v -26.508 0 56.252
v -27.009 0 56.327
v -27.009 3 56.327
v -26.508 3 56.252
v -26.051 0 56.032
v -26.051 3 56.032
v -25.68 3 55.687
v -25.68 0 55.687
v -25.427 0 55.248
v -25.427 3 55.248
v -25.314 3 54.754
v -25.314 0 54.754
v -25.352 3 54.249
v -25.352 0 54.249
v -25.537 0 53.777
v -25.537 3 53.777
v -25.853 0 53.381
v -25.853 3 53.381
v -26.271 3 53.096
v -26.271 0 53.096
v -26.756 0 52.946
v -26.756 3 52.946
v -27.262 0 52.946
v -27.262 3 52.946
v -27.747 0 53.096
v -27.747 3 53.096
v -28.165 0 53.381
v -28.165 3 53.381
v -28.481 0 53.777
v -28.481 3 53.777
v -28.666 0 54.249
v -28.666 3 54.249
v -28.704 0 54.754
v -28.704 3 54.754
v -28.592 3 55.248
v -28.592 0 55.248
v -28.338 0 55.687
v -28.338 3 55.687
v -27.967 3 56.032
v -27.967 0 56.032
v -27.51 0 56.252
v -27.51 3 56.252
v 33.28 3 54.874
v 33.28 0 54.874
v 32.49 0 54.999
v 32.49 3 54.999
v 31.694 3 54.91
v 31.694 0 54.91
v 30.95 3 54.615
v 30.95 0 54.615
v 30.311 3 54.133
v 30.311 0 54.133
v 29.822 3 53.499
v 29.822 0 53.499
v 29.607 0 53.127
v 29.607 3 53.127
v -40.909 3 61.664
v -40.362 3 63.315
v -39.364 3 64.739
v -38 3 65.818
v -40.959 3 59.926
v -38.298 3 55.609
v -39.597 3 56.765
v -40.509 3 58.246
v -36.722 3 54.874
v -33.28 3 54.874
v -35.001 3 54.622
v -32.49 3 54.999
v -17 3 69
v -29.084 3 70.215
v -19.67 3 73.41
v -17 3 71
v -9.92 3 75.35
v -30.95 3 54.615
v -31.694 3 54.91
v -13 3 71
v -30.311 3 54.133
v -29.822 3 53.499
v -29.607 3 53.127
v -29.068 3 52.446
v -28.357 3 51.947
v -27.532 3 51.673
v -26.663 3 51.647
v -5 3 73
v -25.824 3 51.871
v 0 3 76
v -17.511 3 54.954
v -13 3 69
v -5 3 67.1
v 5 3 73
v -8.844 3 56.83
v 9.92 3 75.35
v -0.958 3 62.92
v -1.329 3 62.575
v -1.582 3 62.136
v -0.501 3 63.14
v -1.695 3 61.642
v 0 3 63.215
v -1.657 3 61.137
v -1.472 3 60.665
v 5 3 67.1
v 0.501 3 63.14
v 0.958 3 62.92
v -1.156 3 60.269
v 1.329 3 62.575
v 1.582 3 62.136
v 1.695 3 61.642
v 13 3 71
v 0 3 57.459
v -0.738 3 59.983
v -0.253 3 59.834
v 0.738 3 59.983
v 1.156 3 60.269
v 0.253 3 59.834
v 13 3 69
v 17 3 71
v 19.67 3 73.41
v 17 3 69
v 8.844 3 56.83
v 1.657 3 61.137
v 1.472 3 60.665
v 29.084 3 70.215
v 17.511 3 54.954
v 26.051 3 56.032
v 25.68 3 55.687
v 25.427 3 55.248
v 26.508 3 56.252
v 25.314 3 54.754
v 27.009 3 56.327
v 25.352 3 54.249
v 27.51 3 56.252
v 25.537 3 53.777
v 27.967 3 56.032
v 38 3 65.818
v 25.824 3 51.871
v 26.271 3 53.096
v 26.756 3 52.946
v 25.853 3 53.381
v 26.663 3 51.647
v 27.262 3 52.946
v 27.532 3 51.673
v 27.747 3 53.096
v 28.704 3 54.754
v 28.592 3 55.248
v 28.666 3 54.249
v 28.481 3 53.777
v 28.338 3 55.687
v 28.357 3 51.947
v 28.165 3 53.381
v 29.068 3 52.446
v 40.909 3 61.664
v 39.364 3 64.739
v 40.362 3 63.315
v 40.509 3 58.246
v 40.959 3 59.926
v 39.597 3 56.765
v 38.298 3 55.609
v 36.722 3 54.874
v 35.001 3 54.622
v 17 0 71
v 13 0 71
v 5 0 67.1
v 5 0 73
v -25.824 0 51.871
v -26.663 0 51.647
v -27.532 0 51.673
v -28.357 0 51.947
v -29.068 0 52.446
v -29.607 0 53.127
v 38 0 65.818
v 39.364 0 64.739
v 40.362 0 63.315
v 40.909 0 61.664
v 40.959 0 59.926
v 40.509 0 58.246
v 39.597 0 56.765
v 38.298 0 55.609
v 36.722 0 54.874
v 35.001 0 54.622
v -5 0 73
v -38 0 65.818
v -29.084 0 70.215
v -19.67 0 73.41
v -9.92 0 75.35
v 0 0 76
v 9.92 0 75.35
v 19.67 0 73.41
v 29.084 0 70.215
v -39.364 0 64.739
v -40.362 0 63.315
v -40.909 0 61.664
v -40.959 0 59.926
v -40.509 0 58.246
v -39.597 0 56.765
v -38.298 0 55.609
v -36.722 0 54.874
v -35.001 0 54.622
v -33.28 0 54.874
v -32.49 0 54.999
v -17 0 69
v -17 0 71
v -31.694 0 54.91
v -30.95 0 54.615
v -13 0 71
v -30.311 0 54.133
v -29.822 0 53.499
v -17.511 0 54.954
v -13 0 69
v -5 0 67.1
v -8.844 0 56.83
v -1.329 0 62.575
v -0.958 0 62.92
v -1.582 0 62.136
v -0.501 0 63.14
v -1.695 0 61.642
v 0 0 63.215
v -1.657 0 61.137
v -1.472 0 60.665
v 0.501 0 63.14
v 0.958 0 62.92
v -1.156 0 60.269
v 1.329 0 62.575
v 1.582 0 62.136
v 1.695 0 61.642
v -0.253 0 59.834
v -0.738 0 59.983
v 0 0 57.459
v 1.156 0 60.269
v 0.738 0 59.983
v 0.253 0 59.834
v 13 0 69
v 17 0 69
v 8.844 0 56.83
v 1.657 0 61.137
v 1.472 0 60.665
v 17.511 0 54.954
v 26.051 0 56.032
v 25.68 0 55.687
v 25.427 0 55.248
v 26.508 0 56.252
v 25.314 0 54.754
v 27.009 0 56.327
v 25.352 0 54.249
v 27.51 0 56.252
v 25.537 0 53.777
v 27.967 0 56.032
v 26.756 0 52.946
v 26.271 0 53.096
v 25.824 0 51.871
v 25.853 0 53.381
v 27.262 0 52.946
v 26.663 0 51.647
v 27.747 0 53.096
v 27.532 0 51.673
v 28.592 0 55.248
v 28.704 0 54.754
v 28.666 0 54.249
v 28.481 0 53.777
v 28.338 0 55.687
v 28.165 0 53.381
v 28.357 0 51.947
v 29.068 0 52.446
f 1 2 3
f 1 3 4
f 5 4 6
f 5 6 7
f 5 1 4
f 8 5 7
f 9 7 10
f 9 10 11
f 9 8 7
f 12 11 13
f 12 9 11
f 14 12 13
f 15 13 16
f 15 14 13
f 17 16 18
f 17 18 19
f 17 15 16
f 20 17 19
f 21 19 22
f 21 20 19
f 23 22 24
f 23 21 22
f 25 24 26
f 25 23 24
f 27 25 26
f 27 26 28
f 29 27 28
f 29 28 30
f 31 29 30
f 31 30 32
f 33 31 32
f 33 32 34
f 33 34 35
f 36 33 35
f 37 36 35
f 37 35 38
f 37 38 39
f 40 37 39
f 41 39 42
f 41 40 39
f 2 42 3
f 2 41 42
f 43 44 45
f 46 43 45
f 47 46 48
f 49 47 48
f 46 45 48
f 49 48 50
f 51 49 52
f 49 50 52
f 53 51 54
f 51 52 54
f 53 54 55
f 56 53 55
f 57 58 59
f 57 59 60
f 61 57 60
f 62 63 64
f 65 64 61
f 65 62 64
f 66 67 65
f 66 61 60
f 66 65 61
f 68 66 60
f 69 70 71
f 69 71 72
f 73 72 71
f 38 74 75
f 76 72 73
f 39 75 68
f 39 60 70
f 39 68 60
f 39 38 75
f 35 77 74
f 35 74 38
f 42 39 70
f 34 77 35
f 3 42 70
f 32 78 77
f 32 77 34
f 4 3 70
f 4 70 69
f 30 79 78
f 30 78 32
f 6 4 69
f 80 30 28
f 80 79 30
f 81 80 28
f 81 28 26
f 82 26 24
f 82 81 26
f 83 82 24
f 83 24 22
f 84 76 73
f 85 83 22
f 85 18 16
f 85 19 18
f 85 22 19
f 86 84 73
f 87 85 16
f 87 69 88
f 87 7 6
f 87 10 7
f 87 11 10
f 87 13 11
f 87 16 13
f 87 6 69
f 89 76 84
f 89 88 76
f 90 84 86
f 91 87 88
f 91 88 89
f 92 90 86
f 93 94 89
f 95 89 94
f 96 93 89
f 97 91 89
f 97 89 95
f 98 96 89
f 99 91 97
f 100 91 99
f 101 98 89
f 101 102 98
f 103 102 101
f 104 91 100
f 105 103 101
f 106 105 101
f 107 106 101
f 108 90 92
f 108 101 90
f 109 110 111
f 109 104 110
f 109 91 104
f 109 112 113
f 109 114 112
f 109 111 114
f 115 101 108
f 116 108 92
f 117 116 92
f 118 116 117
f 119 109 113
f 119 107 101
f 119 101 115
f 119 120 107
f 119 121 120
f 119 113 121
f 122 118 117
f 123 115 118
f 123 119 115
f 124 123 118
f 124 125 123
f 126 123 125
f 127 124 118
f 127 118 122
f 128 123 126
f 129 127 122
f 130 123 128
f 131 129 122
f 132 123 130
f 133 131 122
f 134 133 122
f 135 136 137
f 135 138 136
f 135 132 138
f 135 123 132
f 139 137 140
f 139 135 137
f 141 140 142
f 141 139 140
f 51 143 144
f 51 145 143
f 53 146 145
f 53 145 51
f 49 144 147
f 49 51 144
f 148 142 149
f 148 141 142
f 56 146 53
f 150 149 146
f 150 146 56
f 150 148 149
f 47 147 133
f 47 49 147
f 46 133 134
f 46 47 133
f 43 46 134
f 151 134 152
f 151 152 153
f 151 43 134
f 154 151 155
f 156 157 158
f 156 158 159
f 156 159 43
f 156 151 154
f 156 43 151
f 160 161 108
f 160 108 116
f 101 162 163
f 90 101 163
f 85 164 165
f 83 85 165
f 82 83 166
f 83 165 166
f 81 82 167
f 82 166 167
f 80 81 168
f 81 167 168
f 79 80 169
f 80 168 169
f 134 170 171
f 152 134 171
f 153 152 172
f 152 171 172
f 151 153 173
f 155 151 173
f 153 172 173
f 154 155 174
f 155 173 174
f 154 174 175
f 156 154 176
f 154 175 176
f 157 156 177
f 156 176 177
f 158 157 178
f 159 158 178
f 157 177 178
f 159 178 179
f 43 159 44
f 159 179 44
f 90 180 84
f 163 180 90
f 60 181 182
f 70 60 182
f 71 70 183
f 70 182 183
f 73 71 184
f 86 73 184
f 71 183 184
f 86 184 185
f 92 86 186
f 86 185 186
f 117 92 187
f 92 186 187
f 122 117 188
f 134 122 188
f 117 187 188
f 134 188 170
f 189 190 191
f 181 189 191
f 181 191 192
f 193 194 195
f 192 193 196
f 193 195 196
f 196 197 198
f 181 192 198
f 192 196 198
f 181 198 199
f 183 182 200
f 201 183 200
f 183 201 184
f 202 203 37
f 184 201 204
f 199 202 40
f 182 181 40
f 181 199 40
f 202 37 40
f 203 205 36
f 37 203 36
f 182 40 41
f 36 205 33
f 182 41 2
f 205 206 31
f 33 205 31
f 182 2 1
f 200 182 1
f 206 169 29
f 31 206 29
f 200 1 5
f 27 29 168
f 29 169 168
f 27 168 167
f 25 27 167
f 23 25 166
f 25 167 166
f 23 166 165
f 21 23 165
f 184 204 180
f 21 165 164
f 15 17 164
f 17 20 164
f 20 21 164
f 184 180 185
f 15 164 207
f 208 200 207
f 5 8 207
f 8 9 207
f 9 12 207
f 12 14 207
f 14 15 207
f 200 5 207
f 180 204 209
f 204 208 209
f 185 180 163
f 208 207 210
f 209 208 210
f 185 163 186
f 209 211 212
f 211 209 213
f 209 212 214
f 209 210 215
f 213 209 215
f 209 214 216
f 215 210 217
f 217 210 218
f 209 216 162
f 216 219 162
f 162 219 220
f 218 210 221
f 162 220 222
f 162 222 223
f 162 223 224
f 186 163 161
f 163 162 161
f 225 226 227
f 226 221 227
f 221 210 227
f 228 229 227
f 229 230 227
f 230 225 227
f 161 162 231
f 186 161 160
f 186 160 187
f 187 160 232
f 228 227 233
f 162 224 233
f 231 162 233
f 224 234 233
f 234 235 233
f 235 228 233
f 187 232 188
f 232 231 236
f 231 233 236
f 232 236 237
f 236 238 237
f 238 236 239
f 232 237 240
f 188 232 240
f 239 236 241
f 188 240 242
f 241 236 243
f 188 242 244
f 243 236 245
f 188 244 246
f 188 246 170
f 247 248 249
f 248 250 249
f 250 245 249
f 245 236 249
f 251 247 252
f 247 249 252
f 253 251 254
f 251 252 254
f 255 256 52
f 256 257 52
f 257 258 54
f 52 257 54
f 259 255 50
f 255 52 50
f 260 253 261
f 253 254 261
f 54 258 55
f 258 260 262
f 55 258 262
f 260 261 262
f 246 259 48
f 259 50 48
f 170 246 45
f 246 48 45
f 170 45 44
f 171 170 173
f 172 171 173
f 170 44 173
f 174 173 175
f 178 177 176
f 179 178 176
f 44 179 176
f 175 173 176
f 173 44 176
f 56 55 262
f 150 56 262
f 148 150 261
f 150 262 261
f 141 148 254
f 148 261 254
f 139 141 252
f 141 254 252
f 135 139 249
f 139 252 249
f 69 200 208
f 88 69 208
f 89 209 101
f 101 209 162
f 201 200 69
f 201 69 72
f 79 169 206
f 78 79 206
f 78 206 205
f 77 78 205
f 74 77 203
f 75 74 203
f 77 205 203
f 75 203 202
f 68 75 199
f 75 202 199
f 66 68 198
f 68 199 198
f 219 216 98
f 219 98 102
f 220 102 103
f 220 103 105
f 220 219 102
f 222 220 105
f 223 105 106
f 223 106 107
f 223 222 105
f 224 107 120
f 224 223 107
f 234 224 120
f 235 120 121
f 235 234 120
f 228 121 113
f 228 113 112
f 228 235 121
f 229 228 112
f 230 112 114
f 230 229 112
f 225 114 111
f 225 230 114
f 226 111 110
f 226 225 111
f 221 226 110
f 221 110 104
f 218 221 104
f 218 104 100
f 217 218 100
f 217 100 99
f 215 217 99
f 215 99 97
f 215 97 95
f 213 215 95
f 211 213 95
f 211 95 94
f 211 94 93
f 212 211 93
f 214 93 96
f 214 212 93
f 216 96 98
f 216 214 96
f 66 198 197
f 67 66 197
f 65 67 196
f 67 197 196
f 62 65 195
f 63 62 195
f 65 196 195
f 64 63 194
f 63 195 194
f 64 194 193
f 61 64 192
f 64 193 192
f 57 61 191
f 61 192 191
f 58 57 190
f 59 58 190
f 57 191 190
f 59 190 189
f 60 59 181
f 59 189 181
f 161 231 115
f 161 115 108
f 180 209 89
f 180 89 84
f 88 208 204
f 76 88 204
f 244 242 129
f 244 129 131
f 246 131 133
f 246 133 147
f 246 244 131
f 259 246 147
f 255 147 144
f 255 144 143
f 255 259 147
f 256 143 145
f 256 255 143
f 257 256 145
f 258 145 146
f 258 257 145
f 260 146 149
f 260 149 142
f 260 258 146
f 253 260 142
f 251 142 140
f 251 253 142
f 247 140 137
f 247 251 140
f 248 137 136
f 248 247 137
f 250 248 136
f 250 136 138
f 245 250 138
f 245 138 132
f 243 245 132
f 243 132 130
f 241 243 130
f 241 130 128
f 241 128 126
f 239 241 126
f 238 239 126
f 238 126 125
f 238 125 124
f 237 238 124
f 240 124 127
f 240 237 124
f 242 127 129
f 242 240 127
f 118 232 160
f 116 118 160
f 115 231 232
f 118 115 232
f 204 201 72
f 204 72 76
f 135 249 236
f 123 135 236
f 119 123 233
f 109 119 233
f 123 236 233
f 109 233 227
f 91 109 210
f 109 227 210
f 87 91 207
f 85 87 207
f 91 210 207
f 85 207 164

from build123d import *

# Parameters (mm, degrees)
CROQUIS1_R              = 1.7
SALIENTE_EXTRUIR1_DEPTH = 3
CORTAR_EXTRUIR1_REACH   = 88.406
CROQUIS3_W              = 4
CROQUIS3_H              = 2
CROQUIS3_W_2            = 10
CROQUIS3_H_2            = 5.9


with BuildPart() as part:
    # Croquis1 → Saliente-Extruir1 (new body)
    with BuildSketch(Plane(origin=(0, 0, 0), x_dir=(1, 0, 0), z_dir=(0, 1, 0))):
        with BuildLine():
            Line((-29.607107898, -53.127168991), (-29.822053636, -53.49946593))
            ThreePointArc((-29.822053636, -53.49946593), (-31.312291696, -54.787421208), (-33.280086565, -54.873570042))
            ThreePointArc((-33.280086565, -54.873570042), (-40.509483904, -58.24573384), (-38, -65.817930688))
            ThreePointArc((-38, -65.817930688), (0, -76), (38, -65.817930688))
            ThreePointArc((38, -65.817930688), (40.509483904, -58.24573384), (33.280086565, -54.873570042))
            ThreePointArc((33.280086565, -54.873570042), (31.312291696, -54.787421208), (29.822053636, -53.49946593))
            Line((29.822053636, -53.49946593), (29.607107898, -53.127168991))
            ThreePointArc((29.607107898, -53.127168991), (27.954273423, -51.77997422), (25.823903289, -51.871180841))
            ThreePointArc((25.823903289, -51.871180841), (0, -57.458865486), (-25.823903289, -51.871180841))
            ThreePointArc((-25.823903289, -51.871180841), (-27.954273423, -51.77997422), (-29.607107898, -53.127168991))
        make_face()
        with Locations(Location((27.009031687, -54.627168991, 0), (0, 0, 270))):
            Circle(CROQUIS1_R, mode=Mode.SUBTRACT)
        with Locations(Location((0, -61.515130262, 0), (0, 0, 270))):
            Circle(CROQUIS1_R, mode=Mode.SUBTRACT)
        with Locations(Location((-27.009031687, -54.627168991, 0), (0, 0, 270))):
            Circle(CROQUIS1_R, mode=Mode.SUBTRACT)
    extrude(amount=SALIENTE_EXTRUIR1_DEPTH)

    # Croquis3 → Cortar-Extruir1 (cut, up to next)
    with BuildSketch(Plane.XZ, mode=Mode.PRIVATE) as cortar_extruir1_sk1:
        with Locations((15, 70)):
            Rectangle(CROQUIS3_W, CROQUIS3_H)
    cortar_extruir1_tool1 = extrude(cortar_extruir1_sk1.sketch, amount=-CORTAR_EXTRUIR1_REACH, mode=Mode.PRIVATE) & part.part
    # Croquis3 → Cortar-Extruir1 (cut, up to next)
    with BuildSketch(Plane.XZ, mode=Mode.PRIVATE) as cortar_extruir1_sk2:
        with Locations((0, 70.05)):
            Rectangle(CROQUIS3_W_2, CROQUIS3_H_2)
    cortar_extruir1_tool2 = extrude(cortar_extruir1_sk2.sketch, amount=-CORTAR_EXTRUIR1_REACH, mode=Mode.PRIVATE) & part.part
    # Croquis3 → Cortar-Extruir1 (cut, up to next)
    with BuildSketch(Plane.XZ, mode=Mode.PRIVATE) as cortar_extruir1_sk3:
        with Locations((-15, 70)):
            Rectangle(CROQUIS3_W, CROQUIS3_H)
    cortar_extruir1_tool3 = extrude(cortar_extruir1_sk3.sketch, amount=-CORTAR_EXTRUIR1_REACH, mode=Mode.PRIVATE) & part.part
    add(cortar_extruir1_tool1.solids().sort_by_distance((15, 0, 70))[0], mode=Mode.SUBTRACT)
    add(cortar_extruir1_tool2.solids().sort_by_distance((0, 0, 70.05))[0], mode=Mode.SUBTRACT)
    add(cortar_extruir1_tool3.solids().sort_by_distance((-15, 0, 70))[0], mode=Mode.SUBTRACT)


solid = part.part
